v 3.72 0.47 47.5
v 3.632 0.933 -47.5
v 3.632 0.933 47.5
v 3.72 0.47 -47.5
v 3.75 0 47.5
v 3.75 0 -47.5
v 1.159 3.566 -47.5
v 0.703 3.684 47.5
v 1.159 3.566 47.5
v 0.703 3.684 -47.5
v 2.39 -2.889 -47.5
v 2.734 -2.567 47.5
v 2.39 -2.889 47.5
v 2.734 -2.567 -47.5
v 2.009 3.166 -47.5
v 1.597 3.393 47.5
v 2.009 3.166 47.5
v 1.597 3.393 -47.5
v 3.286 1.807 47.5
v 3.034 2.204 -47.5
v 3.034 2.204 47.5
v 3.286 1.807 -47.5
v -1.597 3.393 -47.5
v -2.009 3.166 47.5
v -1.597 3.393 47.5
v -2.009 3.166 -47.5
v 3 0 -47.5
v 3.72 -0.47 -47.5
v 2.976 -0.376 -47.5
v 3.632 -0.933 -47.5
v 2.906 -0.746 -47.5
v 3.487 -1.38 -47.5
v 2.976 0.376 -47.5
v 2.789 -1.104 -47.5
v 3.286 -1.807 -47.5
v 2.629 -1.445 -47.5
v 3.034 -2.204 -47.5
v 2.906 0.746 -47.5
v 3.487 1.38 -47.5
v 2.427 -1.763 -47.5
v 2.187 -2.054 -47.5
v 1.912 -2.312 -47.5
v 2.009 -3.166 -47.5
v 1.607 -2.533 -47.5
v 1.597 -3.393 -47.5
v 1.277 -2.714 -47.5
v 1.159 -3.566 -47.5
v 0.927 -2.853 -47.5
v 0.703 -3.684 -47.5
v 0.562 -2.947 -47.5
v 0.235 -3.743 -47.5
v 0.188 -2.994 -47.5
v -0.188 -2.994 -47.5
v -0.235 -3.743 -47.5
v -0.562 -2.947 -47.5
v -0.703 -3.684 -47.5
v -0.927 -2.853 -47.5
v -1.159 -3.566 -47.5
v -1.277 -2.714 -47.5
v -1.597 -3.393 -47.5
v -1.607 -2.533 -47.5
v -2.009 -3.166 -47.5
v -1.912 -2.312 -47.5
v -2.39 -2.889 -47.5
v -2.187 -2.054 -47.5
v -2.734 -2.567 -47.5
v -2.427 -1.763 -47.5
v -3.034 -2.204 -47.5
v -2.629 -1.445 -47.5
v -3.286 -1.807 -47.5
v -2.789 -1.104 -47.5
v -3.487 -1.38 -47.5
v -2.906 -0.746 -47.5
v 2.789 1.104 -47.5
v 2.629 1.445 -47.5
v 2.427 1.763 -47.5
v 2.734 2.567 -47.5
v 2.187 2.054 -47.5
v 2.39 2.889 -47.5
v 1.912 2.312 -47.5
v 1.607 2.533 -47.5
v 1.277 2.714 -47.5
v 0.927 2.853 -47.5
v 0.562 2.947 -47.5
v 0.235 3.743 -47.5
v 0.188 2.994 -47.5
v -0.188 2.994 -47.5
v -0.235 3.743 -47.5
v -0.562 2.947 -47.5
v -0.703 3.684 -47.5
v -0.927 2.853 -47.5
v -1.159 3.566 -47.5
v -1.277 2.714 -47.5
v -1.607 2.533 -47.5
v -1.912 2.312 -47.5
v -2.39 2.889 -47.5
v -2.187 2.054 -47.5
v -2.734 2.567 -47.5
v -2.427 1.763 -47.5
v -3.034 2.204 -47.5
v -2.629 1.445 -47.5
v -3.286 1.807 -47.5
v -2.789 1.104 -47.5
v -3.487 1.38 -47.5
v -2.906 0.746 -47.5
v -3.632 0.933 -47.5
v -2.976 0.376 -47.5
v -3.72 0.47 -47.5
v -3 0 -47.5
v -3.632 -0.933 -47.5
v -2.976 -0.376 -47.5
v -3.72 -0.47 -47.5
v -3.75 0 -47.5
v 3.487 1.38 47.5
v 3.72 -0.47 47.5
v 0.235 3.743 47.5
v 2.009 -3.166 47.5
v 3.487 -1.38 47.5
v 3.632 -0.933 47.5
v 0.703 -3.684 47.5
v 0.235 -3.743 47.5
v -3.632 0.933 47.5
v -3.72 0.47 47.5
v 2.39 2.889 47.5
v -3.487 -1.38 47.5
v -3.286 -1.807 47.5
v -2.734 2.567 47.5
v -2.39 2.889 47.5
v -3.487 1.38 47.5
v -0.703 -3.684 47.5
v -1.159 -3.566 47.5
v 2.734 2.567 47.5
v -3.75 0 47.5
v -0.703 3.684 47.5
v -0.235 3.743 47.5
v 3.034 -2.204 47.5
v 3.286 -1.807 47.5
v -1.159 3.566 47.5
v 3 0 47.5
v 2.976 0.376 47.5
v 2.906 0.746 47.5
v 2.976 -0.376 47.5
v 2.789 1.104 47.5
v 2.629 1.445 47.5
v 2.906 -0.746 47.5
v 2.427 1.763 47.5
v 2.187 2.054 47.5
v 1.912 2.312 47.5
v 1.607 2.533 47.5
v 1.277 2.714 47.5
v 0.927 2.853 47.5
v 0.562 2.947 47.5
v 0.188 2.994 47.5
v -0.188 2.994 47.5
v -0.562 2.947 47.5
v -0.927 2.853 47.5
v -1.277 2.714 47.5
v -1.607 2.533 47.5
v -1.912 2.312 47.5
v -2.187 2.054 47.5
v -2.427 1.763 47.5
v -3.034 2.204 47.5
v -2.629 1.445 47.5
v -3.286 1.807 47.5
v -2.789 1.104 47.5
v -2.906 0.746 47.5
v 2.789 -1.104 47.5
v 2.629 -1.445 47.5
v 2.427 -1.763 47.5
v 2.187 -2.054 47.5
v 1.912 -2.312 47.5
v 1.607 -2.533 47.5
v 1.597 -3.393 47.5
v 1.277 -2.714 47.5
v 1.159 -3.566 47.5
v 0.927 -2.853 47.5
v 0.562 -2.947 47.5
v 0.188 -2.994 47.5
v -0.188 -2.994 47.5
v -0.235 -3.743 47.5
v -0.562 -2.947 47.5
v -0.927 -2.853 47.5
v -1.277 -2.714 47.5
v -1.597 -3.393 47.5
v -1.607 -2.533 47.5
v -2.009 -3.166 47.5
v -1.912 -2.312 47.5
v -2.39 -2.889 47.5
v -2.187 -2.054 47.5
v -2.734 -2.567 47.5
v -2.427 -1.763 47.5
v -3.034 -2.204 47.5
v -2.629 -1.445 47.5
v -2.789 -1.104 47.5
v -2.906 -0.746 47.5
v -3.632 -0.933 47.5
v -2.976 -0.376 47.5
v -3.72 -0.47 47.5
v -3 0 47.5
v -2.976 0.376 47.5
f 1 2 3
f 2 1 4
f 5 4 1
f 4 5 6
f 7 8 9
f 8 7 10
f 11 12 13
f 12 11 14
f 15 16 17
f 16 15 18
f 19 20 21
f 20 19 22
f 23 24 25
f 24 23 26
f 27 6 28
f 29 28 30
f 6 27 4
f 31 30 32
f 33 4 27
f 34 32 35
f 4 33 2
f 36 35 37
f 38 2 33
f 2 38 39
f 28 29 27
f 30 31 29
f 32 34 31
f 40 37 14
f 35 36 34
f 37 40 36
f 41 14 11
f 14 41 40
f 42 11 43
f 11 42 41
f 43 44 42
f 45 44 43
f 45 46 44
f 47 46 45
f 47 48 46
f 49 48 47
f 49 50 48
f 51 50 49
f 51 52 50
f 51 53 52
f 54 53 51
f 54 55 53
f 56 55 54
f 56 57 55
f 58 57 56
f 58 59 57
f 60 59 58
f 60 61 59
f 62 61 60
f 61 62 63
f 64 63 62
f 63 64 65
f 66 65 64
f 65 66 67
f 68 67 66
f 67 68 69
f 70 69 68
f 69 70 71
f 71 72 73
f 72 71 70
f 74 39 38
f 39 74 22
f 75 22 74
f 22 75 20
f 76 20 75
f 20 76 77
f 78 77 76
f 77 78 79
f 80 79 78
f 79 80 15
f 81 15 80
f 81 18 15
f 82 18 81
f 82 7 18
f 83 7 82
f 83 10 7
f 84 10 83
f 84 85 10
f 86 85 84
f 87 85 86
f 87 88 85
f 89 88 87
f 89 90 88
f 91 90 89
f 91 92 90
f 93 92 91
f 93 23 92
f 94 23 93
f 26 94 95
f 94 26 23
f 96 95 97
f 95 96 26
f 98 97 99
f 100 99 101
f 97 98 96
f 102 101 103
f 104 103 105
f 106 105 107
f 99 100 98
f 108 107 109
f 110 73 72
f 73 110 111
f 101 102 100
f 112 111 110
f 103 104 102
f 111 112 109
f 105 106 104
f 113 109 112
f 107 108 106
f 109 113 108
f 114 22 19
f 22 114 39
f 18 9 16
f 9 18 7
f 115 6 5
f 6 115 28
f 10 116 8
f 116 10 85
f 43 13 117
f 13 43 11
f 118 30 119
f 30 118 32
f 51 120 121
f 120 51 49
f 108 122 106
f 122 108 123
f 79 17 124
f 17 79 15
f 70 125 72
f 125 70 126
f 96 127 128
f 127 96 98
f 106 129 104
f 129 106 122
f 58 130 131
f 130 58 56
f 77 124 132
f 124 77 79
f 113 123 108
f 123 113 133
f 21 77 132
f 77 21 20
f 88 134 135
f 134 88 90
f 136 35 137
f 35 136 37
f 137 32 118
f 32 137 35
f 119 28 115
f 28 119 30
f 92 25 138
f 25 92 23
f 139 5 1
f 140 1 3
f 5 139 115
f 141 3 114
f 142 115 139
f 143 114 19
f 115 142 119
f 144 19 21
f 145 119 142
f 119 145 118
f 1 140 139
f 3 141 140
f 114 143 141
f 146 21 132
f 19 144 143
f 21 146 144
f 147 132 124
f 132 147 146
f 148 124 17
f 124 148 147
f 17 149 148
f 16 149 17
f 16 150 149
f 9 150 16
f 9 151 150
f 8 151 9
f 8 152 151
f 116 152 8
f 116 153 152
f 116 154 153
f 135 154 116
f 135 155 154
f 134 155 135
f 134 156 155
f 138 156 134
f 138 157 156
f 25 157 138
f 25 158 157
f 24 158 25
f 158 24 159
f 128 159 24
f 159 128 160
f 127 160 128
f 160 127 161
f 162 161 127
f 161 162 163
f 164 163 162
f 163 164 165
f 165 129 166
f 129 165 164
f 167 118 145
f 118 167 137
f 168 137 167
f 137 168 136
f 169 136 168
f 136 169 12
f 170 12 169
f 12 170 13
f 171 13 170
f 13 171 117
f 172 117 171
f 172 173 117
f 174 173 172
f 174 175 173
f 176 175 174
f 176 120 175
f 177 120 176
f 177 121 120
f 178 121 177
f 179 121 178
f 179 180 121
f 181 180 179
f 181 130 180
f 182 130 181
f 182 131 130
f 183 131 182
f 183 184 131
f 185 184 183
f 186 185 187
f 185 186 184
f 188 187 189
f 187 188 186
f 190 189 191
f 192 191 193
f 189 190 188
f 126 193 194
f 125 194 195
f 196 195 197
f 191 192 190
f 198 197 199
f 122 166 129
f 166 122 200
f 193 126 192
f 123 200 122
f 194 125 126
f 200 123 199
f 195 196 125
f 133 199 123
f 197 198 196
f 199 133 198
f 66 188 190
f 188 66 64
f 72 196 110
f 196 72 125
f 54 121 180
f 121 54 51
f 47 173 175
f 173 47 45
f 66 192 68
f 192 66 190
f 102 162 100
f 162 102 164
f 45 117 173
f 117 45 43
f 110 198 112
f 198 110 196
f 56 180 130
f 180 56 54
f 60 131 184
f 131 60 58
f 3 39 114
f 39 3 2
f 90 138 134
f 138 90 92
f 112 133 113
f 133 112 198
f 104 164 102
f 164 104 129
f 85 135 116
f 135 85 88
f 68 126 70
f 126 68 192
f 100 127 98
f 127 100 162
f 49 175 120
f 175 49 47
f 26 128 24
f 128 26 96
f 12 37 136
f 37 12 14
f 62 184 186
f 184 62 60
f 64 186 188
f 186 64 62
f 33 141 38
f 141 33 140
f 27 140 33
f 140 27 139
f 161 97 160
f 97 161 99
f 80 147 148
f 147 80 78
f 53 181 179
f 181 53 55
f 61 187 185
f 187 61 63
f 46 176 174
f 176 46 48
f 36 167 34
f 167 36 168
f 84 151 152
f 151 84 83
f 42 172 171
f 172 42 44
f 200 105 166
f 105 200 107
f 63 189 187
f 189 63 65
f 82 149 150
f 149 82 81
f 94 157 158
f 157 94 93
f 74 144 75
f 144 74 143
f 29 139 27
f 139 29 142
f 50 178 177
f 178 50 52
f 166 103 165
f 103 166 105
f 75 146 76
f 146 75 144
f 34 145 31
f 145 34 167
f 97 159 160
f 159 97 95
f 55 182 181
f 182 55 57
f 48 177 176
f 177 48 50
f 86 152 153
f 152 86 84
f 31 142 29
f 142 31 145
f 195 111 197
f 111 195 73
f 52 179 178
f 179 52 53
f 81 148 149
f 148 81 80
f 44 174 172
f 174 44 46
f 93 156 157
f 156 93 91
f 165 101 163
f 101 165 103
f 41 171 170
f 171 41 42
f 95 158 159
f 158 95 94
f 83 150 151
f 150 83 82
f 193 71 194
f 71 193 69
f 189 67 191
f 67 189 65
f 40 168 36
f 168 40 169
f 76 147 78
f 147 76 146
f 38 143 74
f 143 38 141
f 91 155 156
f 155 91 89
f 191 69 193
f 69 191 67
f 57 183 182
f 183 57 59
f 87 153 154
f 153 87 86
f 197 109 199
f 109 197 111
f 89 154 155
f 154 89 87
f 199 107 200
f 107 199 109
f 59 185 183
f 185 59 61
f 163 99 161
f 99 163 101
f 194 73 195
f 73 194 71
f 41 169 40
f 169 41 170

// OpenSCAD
$fn = 50;


difference() {
	union() {
		translate(v = [0, 0, -47.5000000000]) {
			cylinder(h = 95, r = 3.7500000000);
		}
	}
	union() {
		translate(v = [0, 0, -100.0000000000]) {
			cylinder(h = 200, r = 3.0000000000);
		}
	}
}
